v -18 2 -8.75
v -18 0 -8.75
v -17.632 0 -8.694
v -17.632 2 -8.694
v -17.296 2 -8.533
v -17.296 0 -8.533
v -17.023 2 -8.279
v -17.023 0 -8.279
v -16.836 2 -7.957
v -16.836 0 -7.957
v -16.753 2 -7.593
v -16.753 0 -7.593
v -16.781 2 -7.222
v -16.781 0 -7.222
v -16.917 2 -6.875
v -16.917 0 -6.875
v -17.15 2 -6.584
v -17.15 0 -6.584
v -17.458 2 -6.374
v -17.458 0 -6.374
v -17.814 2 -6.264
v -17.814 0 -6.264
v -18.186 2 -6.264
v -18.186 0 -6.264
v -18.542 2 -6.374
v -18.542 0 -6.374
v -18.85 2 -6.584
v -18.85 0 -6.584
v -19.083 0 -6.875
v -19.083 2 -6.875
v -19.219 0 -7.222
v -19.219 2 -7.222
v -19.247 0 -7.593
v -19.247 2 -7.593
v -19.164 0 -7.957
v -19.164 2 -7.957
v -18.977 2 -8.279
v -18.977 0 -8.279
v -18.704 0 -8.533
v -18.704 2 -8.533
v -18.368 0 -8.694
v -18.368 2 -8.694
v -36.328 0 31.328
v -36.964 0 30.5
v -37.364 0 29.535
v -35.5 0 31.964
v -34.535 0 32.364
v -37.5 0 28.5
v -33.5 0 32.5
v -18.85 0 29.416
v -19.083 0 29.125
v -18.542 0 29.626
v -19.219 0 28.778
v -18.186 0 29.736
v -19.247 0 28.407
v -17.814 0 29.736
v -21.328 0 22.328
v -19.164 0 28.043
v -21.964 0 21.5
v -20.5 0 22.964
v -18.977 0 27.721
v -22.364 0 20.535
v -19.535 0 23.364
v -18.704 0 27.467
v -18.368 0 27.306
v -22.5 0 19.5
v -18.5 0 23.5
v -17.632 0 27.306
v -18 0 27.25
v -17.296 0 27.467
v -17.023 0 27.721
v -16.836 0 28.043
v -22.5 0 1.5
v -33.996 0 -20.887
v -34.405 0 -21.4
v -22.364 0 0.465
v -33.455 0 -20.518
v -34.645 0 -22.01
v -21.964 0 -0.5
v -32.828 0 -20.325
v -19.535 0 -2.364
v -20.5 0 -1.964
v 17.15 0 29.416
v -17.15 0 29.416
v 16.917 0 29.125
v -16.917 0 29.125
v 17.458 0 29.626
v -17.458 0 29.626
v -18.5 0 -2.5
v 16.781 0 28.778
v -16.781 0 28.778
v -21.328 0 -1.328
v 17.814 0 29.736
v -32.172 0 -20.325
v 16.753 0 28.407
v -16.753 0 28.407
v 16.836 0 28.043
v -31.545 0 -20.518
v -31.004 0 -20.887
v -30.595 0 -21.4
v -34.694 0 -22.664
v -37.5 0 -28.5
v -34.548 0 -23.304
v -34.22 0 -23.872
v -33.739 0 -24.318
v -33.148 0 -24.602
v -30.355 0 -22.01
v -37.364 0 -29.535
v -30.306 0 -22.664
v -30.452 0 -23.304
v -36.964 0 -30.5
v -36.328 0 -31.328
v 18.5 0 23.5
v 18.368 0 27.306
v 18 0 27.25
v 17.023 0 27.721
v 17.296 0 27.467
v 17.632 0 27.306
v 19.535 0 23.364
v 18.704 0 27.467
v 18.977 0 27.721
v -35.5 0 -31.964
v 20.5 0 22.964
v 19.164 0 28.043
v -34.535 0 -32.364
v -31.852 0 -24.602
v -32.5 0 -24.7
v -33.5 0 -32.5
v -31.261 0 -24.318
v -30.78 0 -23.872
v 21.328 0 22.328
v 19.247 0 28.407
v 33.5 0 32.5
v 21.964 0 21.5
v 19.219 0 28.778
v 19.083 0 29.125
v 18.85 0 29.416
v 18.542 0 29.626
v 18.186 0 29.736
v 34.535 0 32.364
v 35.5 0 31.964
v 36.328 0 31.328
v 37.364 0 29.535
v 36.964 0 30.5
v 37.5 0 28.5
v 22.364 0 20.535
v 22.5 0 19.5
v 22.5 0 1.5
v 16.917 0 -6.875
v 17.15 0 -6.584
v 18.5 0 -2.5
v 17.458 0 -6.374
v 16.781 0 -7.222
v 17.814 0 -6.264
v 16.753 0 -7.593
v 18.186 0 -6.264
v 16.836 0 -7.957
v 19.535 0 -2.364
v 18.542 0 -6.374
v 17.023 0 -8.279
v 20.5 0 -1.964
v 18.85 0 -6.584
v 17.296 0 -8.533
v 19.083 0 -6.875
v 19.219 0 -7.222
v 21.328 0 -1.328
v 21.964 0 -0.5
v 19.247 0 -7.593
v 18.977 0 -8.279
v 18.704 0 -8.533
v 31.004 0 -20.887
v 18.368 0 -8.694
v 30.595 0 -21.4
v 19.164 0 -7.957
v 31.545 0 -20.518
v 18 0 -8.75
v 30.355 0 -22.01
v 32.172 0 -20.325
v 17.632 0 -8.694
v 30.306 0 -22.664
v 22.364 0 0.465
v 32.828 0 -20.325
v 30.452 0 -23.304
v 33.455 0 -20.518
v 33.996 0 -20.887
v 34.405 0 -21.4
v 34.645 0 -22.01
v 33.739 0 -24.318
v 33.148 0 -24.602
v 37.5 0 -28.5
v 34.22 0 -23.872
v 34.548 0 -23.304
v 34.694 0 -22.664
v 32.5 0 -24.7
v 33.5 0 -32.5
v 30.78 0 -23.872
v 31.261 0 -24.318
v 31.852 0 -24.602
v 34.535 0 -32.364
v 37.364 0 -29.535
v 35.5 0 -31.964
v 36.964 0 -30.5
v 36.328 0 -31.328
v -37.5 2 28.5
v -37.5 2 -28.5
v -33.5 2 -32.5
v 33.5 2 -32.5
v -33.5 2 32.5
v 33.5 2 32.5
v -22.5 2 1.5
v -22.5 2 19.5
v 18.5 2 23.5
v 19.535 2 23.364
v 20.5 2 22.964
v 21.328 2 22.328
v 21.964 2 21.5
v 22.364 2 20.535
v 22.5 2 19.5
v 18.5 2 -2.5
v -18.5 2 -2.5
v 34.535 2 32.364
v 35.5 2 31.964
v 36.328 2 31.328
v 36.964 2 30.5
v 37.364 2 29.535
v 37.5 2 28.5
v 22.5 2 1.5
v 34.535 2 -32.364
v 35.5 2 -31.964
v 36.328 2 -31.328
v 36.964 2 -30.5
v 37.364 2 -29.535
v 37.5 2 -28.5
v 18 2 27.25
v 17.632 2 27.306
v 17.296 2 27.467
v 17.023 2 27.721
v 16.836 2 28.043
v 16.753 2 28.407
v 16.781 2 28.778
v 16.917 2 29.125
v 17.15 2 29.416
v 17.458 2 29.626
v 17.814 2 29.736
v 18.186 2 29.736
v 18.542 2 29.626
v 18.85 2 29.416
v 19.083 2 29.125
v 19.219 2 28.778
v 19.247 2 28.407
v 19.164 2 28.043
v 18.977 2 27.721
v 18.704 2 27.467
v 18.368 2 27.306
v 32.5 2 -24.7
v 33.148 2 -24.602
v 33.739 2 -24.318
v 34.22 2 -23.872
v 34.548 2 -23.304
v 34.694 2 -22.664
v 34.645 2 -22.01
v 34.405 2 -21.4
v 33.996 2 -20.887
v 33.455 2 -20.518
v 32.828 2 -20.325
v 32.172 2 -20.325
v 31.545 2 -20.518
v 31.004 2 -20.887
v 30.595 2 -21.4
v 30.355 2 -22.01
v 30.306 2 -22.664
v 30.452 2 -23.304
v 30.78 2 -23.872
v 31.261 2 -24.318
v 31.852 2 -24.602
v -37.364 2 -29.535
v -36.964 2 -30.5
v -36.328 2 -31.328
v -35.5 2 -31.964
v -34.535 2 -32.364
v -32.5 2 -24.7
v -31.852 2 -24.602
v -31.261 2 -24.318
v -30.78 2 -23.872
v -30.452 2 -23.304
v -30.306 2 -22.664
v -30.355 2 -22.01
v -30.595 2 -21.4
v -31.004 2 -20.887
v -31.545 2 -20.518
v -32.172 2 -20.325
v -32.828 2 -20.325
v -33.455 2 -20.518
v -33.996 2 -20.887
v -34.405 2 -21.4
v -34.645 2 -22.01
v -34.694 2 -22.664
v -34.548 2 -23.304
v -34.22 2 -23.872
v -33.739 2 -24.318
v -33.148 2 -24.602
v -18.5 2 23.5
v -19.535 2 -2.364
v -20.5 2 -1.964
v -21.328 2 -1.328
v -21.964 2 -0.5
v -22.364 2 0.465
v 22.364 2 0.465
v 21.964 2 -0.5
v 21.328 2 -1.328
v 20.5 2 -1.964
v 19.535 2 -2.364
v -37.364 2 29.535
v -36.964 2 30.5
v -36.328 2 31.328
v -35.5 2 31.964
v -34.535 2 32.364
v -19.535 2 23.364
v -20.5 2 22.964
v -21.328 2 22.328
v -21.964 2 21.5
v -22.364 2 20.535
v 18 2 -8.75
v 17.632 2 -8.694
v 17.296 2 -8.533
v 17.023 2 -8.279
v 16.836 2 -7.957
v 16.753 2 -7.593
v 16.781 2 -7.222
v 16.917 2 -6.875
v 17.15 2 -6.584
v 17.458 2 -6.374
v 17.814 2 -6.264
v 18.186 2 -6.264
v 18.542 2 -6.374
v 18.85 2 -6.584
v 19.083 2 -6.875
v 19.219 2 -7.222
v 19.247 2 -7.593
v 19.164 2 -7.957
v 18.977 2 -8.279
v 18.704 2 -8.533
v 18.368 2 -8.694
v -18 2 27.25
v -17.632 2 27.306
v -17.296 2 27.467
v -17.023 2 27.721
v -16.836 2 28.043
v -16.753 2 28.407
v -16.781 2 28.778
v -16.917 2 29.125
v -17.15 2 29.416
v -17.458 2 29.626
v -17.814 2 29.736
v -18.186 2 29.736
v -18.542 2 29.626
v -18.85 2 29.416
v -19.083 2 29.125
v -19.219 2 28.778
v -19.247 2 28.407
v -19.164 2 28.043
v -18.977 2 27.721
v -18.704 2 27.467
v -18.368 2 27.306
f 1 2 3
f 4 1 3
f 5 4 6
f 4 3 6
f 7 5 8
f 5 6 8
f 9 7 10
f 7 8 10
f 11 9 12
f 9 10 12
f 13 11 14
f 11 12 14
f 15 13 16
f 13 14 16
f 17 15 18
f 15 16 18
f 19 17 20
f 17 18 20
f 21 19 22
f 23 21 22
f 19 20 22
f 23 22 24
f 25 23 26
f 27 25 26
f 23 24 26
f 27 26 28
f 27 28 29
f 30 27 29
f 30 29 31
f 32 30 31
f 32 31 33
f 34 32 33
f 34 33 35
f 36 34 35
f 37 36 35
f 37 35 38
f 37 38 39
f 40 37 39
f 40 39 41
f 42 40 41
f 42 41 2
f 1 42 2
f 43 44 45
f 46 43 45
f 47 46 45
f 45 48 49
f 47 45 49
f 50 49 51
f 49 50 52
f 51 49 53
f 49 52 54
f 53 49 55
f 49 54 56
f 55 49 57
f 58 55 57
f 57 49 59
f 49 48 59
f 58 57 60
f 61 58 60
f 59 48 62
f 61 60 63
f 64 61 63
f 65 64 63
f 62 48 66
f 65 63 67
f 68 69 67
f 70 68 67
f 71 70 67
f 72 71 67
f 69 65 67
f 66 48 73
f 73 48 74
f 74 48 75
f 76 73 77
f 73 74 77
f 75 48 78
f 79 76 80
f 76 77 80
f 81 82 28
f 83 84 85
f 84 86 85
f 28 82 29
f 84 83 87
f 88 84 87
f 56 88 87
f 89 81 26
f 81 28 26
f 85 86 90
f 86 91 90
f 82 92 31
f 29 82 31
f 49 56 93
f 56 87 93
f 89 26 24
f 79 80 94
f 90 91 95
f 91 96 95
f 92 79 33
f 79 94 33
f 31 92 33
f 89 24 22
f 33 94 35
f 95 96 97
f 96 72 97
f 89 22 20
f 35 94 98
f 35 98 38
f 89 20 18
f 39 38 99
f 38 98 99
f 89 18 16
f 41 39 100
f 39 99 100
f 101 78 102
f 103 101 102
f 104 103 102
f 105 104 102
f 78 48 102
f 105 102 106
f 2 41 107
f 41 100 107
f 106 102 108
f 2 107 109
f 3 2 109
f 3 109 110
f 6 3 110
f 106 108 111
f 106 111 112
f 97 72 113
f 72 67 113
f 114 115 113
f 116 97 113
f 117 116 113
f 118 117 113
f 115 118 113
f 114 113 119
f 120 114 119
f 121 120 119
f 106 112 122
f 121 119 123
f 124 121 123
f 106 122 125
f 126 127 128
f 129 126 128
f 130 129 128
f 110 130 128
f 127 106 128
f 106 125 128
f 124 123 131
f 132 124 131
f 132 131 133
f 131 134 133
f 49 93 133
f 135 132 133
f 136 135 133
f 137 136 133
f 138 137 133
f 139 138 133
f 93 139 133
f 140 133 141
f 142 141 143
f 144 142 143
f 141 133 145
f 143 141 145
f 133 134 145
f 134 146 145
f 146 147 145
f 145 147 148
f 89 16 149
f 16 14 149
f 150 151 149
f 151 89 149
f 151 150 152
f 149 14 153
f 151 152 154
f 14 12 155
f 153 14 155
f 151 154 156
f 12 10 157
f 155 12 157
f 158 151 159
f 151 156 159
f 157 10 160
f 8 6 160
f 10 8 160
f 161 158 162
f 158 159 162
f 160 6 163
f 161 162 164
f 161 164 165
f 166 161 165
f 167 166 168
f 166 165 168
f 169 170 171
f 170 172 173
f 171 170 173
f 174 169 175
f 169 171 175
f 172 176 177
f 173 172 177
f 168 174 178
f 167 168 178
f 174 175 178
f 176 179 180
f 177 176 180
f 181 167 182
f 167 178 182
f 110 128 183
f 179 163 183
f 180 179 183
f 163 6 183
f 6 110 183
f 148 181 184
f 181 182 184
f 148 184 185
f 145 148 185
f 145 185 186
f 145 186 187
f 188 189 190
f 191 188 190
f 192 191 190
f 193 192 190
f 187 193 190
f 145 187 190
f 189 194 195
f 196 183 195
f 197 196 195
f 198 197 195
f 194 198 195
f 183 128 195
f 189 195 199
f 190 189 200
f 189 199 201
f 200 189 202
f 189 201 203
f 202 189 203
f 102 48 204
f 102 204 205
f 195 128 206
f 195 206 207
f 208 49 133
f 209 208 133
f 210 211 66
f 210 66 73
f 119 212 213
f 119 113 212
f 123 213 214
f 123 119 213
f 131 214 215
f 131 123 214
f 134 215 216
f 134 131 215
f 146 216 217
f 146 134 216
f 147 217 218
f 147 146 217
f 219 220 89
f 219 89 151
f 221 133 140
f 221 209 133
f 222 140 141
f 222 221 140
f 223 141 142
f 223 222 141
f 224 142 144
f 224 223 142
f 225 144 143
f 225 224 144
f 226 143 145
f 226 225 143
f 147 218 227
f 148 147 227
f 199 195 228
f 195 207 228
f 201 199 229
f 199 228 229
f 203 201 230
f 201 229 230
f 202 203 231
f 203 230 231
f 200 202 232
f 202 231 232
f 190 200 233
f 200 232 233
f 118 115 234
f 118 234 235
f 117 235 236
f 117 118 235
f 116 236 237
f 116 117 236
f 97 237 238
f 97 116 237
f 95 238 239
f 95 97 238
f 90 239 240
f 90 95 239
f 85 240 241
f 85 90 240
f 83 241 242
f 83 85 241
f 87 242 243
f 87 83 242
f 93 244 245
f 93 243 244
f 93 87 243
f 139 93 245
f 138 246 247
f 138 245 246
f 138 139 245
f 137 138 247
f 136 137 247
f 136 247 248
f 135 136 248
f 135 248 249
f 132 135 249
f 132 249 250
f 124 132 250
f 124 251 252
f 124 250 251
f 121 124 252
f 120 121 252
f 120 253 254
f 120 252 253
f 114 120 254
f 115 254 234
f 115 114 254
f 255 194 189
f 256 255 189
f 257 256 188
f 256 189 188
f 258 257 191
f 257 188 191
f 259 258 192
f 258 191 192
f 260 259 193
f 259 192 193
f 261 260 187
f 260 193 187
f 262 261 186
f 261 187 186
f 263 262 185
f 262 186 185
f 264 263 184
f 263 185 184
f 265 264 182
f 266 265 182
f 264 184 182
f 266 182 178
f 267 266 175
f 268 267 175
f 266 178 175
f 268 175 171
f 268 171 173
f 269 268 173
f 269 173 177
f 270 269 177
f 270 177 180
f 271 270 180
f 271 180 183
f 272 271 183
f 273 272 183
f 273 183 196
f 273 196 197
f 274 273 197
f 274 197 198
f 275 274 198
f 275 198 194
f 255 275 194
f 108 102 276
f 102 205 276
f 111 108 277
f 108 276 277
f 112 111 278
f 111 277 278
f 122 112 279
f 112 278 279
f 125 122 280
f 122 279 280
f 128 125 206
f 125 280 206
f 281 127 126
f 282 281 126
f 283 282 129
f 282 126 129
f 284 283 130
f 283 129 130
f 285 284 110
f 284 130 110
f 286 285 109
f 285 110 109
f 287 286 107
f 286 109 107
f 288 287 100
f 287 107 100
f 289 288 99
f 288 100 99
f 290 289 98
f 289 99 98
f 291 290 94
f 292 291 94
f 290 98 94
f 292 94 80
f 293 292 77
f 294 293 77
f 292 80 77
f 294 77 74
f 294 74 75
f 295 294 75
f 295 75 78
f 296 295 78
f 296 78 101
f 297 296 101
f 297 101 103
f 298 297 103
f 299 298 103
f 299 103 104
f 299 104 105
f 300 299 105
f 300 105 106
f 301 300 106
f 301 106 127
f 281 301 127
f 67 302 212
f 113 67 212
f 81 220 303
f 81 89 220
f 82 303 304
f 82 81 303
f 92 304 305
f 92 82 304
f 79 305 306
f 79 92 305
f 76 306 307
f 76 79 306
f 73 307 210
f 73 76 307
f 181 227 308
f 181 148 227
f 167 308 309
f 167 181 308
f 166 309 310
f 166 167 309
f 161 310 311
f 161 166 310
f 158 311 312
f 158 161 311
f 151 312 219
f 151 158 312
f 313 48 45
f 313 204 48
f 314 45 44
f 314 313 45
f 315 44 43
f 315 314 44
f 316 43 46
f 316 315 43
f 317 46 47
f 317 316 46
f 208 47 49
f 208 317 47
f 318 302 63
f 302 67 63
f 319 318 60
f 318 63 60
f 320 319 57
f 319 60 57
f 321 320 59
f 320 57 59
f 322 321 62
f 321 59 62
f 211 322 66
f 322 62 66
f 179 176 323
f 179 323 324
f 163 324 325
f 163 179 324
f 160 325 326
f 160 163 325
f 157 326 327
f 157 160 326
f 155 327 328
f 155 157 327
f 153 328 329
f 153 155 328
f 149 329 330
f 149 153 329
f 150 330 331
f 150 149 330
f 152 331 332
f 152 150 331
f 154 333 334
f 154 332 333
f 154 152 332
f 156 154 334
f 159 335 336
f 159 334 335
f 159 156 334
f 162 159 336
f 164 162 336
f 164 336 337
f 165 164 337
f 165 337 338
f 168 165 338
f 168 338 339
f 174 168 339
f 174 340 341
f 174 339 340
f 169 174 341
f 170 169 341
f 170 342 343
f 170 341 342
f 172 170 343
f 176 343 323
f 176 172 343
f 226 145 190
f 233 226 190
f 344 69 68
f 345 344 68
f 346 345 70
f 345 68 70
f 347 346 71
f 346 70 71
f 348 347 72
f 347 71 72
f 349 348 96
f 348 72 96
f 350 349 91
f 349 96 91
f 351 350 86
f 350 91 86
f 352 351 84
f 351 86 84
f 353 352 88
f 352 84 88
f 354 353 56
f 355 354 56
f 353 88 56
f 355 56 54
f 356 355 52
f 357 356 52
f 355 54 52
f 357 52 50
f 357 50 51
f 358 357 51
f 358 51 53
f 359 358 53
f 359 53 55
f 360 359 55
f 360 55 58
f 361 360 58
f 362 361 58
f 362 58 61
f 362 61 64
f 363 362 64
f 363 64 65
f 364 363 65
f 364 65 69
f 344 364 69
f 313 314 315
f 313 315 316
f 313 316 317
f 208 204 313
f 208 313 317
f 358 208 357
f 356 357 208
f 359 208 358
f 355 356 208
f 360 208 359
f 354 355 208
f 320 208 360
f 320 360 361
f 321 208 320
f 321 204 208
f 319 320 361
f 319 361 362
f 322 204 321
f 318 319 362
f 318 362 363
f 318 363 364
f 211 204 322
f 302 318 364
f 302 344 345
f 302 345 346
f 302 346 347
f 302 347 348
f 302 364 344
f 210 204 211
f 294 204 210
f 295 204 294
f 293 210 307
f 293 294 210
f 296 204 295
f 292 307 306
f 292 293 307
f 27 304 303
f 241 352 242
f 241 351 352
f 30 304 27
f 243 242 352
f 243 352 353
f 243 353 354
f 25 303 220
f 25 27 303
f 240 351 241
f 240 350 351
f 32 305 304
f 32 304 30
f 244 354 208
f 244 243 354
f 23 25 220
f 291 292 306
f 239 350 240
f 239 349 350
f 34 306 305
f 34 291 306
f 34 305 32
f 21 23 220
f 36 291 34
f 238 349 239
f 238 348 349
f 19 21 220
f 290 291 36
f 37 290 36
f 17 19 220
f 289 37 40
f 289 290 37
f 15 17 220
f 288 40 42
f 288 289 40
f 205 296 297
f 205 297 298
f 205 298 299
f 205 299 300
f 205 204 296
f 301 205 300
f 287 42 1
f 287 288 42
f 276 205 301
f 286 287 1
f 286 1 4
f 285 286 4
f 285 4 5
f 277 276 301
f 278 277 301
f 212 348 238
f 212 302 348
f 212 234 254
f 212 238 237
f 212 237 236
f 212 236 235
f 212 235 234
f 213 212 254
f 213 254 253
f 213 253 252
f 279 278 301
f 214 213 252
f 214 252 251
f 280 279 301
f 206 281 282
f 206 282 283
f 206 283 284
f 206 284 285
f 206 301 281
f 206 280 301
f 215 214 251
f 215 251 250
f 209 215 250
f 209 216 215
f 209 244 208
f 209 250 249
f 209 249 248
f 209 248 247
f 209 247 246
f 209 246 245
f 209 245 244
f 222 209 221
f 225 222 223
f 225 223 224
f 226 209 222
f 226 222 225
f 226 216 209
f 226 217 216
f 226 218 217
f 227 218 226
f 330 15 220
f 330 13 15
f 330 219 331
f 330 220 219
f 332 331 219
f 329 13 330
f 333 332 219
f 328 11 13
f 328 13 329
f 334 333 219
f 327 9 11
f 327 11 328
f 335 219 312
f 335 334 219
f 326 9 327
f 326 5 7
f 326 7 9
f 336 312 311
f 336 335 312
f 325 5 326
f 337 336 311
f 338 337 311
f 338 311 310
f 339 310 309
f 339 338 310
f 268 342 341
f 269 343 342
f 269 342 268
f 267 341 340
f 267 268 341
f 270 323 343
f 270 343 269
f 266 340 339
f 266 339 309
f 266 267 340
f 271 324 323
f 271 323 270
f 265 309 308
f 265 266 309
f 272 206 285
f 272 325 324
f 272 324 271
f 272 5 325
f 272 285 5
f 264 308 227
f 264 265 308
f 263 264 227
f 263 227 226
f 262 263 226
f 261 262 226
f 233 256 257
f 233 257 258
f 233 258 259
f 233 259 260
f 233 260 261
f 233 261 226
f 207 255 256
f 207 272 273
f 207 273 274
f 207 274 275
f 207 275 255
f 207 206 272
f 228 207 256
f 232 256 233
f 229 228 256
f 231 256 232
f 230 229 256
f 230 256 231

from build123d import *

# Parameters (mm, degrees)
SKETCH_1_W              = 75
SKETCH_1_H              = 65
EXTRUDE_1_DEPTH         = 2
HOLE_WIZARD_4_4_4_4_1_D = 4.4
HOLE_WIZARD_2_5_2_5_1_D = 2.5
FILLET_1_R              = 4
SKETCH_6_W              = 45
SKETCH_6_H              = 26
CUT_EXTRUDE_1_DEPTH     = 50.663870167
FILLET_2_R              = 4


with BuildPart() as part:
    # 草图1 → 凸台-拉伸1 (new body)
    with BuildSketch(Plane(origin=(0, 0, 0), x_dir=(1, 0, 0), z_dir=(0, 1, 0))):
        Rectangle(SKETCH_1_W, SKETCH_1_H)
    extrude(amount=EXTRUDE_1_DEPTH)

    # Ø4.4 (4.4) 直径孔1 (through all)
    with Locations(Plane(origin=(-32.5, 2, -22.5), x_dir=(0, 0, 1), z_dir=(0, 1, 0))):
        with Locations((0, 0), (0, 65)):
            Hole(HOLE_WIZARD_4_4_4_4_1_D / 2)

    # Ø2.5 (2.5) 直径孔1 (through all)
    with Locations(Plane(origin=(-18, 2, -7.5), x_dir=(0, 0, 1), z_dir=(0, 1, 0))):
        with Locations((0, 0), (36, 0)):
            hole_wizard_2_5_2_5_1 = Hole(HOLE_WIZARD_2_5_2_5_1_D / 2)

    # 镜向1: Ø2.5 (2.5) 直径孔1 across plane
    add(hole_wizard_2_5_2_5_1.mirror(Plane(origin=(0, 0, 0), x_dir=(0, 0, 1), z_dir=(1, 0, 0))), mode=Mode.SUBTRACT)

    # 圆角1
    fillet_1_edges = [part.edges().sort_by_distance(p)[0] for p in [
        (37.5, 1, 32.5),
        (-37.5, 1, 32.5),
        (-37.5, 1, -32.5),
        (37.5, 1, -32.5),
    ]]
    fillet(fillet_1_edges, radius=FILLET_1_R)

    # 草图6 → 切除-拉伸1 (cut, through all)
    with BuildSketch(Plane(origin=(0, 2, 0), x_dir=(1, 0, 0), z_dir=(0, 1, 0))):
        with Locations((0, -10.5)):
            Rectangle(SKETCH_6_W, SKETCH_6_H)
    extrude(amount=-CUT_EXTRUDE_1_DEPTH, mode=Mode.SUBTRACT)

    # 圆角2
    fillet_2_edges = [part.edges().sort_by_distance(p)[0] for p in [
        (-22.5, 1, 23.5),
        (-22.5, 1, -2.5),
        (22.5, 1, -2.5),
        (22.5, 1, 23.5),
    ]]
    fillet(fillet_2_edges, radius=FILLET_2_R)


solid = part.part
